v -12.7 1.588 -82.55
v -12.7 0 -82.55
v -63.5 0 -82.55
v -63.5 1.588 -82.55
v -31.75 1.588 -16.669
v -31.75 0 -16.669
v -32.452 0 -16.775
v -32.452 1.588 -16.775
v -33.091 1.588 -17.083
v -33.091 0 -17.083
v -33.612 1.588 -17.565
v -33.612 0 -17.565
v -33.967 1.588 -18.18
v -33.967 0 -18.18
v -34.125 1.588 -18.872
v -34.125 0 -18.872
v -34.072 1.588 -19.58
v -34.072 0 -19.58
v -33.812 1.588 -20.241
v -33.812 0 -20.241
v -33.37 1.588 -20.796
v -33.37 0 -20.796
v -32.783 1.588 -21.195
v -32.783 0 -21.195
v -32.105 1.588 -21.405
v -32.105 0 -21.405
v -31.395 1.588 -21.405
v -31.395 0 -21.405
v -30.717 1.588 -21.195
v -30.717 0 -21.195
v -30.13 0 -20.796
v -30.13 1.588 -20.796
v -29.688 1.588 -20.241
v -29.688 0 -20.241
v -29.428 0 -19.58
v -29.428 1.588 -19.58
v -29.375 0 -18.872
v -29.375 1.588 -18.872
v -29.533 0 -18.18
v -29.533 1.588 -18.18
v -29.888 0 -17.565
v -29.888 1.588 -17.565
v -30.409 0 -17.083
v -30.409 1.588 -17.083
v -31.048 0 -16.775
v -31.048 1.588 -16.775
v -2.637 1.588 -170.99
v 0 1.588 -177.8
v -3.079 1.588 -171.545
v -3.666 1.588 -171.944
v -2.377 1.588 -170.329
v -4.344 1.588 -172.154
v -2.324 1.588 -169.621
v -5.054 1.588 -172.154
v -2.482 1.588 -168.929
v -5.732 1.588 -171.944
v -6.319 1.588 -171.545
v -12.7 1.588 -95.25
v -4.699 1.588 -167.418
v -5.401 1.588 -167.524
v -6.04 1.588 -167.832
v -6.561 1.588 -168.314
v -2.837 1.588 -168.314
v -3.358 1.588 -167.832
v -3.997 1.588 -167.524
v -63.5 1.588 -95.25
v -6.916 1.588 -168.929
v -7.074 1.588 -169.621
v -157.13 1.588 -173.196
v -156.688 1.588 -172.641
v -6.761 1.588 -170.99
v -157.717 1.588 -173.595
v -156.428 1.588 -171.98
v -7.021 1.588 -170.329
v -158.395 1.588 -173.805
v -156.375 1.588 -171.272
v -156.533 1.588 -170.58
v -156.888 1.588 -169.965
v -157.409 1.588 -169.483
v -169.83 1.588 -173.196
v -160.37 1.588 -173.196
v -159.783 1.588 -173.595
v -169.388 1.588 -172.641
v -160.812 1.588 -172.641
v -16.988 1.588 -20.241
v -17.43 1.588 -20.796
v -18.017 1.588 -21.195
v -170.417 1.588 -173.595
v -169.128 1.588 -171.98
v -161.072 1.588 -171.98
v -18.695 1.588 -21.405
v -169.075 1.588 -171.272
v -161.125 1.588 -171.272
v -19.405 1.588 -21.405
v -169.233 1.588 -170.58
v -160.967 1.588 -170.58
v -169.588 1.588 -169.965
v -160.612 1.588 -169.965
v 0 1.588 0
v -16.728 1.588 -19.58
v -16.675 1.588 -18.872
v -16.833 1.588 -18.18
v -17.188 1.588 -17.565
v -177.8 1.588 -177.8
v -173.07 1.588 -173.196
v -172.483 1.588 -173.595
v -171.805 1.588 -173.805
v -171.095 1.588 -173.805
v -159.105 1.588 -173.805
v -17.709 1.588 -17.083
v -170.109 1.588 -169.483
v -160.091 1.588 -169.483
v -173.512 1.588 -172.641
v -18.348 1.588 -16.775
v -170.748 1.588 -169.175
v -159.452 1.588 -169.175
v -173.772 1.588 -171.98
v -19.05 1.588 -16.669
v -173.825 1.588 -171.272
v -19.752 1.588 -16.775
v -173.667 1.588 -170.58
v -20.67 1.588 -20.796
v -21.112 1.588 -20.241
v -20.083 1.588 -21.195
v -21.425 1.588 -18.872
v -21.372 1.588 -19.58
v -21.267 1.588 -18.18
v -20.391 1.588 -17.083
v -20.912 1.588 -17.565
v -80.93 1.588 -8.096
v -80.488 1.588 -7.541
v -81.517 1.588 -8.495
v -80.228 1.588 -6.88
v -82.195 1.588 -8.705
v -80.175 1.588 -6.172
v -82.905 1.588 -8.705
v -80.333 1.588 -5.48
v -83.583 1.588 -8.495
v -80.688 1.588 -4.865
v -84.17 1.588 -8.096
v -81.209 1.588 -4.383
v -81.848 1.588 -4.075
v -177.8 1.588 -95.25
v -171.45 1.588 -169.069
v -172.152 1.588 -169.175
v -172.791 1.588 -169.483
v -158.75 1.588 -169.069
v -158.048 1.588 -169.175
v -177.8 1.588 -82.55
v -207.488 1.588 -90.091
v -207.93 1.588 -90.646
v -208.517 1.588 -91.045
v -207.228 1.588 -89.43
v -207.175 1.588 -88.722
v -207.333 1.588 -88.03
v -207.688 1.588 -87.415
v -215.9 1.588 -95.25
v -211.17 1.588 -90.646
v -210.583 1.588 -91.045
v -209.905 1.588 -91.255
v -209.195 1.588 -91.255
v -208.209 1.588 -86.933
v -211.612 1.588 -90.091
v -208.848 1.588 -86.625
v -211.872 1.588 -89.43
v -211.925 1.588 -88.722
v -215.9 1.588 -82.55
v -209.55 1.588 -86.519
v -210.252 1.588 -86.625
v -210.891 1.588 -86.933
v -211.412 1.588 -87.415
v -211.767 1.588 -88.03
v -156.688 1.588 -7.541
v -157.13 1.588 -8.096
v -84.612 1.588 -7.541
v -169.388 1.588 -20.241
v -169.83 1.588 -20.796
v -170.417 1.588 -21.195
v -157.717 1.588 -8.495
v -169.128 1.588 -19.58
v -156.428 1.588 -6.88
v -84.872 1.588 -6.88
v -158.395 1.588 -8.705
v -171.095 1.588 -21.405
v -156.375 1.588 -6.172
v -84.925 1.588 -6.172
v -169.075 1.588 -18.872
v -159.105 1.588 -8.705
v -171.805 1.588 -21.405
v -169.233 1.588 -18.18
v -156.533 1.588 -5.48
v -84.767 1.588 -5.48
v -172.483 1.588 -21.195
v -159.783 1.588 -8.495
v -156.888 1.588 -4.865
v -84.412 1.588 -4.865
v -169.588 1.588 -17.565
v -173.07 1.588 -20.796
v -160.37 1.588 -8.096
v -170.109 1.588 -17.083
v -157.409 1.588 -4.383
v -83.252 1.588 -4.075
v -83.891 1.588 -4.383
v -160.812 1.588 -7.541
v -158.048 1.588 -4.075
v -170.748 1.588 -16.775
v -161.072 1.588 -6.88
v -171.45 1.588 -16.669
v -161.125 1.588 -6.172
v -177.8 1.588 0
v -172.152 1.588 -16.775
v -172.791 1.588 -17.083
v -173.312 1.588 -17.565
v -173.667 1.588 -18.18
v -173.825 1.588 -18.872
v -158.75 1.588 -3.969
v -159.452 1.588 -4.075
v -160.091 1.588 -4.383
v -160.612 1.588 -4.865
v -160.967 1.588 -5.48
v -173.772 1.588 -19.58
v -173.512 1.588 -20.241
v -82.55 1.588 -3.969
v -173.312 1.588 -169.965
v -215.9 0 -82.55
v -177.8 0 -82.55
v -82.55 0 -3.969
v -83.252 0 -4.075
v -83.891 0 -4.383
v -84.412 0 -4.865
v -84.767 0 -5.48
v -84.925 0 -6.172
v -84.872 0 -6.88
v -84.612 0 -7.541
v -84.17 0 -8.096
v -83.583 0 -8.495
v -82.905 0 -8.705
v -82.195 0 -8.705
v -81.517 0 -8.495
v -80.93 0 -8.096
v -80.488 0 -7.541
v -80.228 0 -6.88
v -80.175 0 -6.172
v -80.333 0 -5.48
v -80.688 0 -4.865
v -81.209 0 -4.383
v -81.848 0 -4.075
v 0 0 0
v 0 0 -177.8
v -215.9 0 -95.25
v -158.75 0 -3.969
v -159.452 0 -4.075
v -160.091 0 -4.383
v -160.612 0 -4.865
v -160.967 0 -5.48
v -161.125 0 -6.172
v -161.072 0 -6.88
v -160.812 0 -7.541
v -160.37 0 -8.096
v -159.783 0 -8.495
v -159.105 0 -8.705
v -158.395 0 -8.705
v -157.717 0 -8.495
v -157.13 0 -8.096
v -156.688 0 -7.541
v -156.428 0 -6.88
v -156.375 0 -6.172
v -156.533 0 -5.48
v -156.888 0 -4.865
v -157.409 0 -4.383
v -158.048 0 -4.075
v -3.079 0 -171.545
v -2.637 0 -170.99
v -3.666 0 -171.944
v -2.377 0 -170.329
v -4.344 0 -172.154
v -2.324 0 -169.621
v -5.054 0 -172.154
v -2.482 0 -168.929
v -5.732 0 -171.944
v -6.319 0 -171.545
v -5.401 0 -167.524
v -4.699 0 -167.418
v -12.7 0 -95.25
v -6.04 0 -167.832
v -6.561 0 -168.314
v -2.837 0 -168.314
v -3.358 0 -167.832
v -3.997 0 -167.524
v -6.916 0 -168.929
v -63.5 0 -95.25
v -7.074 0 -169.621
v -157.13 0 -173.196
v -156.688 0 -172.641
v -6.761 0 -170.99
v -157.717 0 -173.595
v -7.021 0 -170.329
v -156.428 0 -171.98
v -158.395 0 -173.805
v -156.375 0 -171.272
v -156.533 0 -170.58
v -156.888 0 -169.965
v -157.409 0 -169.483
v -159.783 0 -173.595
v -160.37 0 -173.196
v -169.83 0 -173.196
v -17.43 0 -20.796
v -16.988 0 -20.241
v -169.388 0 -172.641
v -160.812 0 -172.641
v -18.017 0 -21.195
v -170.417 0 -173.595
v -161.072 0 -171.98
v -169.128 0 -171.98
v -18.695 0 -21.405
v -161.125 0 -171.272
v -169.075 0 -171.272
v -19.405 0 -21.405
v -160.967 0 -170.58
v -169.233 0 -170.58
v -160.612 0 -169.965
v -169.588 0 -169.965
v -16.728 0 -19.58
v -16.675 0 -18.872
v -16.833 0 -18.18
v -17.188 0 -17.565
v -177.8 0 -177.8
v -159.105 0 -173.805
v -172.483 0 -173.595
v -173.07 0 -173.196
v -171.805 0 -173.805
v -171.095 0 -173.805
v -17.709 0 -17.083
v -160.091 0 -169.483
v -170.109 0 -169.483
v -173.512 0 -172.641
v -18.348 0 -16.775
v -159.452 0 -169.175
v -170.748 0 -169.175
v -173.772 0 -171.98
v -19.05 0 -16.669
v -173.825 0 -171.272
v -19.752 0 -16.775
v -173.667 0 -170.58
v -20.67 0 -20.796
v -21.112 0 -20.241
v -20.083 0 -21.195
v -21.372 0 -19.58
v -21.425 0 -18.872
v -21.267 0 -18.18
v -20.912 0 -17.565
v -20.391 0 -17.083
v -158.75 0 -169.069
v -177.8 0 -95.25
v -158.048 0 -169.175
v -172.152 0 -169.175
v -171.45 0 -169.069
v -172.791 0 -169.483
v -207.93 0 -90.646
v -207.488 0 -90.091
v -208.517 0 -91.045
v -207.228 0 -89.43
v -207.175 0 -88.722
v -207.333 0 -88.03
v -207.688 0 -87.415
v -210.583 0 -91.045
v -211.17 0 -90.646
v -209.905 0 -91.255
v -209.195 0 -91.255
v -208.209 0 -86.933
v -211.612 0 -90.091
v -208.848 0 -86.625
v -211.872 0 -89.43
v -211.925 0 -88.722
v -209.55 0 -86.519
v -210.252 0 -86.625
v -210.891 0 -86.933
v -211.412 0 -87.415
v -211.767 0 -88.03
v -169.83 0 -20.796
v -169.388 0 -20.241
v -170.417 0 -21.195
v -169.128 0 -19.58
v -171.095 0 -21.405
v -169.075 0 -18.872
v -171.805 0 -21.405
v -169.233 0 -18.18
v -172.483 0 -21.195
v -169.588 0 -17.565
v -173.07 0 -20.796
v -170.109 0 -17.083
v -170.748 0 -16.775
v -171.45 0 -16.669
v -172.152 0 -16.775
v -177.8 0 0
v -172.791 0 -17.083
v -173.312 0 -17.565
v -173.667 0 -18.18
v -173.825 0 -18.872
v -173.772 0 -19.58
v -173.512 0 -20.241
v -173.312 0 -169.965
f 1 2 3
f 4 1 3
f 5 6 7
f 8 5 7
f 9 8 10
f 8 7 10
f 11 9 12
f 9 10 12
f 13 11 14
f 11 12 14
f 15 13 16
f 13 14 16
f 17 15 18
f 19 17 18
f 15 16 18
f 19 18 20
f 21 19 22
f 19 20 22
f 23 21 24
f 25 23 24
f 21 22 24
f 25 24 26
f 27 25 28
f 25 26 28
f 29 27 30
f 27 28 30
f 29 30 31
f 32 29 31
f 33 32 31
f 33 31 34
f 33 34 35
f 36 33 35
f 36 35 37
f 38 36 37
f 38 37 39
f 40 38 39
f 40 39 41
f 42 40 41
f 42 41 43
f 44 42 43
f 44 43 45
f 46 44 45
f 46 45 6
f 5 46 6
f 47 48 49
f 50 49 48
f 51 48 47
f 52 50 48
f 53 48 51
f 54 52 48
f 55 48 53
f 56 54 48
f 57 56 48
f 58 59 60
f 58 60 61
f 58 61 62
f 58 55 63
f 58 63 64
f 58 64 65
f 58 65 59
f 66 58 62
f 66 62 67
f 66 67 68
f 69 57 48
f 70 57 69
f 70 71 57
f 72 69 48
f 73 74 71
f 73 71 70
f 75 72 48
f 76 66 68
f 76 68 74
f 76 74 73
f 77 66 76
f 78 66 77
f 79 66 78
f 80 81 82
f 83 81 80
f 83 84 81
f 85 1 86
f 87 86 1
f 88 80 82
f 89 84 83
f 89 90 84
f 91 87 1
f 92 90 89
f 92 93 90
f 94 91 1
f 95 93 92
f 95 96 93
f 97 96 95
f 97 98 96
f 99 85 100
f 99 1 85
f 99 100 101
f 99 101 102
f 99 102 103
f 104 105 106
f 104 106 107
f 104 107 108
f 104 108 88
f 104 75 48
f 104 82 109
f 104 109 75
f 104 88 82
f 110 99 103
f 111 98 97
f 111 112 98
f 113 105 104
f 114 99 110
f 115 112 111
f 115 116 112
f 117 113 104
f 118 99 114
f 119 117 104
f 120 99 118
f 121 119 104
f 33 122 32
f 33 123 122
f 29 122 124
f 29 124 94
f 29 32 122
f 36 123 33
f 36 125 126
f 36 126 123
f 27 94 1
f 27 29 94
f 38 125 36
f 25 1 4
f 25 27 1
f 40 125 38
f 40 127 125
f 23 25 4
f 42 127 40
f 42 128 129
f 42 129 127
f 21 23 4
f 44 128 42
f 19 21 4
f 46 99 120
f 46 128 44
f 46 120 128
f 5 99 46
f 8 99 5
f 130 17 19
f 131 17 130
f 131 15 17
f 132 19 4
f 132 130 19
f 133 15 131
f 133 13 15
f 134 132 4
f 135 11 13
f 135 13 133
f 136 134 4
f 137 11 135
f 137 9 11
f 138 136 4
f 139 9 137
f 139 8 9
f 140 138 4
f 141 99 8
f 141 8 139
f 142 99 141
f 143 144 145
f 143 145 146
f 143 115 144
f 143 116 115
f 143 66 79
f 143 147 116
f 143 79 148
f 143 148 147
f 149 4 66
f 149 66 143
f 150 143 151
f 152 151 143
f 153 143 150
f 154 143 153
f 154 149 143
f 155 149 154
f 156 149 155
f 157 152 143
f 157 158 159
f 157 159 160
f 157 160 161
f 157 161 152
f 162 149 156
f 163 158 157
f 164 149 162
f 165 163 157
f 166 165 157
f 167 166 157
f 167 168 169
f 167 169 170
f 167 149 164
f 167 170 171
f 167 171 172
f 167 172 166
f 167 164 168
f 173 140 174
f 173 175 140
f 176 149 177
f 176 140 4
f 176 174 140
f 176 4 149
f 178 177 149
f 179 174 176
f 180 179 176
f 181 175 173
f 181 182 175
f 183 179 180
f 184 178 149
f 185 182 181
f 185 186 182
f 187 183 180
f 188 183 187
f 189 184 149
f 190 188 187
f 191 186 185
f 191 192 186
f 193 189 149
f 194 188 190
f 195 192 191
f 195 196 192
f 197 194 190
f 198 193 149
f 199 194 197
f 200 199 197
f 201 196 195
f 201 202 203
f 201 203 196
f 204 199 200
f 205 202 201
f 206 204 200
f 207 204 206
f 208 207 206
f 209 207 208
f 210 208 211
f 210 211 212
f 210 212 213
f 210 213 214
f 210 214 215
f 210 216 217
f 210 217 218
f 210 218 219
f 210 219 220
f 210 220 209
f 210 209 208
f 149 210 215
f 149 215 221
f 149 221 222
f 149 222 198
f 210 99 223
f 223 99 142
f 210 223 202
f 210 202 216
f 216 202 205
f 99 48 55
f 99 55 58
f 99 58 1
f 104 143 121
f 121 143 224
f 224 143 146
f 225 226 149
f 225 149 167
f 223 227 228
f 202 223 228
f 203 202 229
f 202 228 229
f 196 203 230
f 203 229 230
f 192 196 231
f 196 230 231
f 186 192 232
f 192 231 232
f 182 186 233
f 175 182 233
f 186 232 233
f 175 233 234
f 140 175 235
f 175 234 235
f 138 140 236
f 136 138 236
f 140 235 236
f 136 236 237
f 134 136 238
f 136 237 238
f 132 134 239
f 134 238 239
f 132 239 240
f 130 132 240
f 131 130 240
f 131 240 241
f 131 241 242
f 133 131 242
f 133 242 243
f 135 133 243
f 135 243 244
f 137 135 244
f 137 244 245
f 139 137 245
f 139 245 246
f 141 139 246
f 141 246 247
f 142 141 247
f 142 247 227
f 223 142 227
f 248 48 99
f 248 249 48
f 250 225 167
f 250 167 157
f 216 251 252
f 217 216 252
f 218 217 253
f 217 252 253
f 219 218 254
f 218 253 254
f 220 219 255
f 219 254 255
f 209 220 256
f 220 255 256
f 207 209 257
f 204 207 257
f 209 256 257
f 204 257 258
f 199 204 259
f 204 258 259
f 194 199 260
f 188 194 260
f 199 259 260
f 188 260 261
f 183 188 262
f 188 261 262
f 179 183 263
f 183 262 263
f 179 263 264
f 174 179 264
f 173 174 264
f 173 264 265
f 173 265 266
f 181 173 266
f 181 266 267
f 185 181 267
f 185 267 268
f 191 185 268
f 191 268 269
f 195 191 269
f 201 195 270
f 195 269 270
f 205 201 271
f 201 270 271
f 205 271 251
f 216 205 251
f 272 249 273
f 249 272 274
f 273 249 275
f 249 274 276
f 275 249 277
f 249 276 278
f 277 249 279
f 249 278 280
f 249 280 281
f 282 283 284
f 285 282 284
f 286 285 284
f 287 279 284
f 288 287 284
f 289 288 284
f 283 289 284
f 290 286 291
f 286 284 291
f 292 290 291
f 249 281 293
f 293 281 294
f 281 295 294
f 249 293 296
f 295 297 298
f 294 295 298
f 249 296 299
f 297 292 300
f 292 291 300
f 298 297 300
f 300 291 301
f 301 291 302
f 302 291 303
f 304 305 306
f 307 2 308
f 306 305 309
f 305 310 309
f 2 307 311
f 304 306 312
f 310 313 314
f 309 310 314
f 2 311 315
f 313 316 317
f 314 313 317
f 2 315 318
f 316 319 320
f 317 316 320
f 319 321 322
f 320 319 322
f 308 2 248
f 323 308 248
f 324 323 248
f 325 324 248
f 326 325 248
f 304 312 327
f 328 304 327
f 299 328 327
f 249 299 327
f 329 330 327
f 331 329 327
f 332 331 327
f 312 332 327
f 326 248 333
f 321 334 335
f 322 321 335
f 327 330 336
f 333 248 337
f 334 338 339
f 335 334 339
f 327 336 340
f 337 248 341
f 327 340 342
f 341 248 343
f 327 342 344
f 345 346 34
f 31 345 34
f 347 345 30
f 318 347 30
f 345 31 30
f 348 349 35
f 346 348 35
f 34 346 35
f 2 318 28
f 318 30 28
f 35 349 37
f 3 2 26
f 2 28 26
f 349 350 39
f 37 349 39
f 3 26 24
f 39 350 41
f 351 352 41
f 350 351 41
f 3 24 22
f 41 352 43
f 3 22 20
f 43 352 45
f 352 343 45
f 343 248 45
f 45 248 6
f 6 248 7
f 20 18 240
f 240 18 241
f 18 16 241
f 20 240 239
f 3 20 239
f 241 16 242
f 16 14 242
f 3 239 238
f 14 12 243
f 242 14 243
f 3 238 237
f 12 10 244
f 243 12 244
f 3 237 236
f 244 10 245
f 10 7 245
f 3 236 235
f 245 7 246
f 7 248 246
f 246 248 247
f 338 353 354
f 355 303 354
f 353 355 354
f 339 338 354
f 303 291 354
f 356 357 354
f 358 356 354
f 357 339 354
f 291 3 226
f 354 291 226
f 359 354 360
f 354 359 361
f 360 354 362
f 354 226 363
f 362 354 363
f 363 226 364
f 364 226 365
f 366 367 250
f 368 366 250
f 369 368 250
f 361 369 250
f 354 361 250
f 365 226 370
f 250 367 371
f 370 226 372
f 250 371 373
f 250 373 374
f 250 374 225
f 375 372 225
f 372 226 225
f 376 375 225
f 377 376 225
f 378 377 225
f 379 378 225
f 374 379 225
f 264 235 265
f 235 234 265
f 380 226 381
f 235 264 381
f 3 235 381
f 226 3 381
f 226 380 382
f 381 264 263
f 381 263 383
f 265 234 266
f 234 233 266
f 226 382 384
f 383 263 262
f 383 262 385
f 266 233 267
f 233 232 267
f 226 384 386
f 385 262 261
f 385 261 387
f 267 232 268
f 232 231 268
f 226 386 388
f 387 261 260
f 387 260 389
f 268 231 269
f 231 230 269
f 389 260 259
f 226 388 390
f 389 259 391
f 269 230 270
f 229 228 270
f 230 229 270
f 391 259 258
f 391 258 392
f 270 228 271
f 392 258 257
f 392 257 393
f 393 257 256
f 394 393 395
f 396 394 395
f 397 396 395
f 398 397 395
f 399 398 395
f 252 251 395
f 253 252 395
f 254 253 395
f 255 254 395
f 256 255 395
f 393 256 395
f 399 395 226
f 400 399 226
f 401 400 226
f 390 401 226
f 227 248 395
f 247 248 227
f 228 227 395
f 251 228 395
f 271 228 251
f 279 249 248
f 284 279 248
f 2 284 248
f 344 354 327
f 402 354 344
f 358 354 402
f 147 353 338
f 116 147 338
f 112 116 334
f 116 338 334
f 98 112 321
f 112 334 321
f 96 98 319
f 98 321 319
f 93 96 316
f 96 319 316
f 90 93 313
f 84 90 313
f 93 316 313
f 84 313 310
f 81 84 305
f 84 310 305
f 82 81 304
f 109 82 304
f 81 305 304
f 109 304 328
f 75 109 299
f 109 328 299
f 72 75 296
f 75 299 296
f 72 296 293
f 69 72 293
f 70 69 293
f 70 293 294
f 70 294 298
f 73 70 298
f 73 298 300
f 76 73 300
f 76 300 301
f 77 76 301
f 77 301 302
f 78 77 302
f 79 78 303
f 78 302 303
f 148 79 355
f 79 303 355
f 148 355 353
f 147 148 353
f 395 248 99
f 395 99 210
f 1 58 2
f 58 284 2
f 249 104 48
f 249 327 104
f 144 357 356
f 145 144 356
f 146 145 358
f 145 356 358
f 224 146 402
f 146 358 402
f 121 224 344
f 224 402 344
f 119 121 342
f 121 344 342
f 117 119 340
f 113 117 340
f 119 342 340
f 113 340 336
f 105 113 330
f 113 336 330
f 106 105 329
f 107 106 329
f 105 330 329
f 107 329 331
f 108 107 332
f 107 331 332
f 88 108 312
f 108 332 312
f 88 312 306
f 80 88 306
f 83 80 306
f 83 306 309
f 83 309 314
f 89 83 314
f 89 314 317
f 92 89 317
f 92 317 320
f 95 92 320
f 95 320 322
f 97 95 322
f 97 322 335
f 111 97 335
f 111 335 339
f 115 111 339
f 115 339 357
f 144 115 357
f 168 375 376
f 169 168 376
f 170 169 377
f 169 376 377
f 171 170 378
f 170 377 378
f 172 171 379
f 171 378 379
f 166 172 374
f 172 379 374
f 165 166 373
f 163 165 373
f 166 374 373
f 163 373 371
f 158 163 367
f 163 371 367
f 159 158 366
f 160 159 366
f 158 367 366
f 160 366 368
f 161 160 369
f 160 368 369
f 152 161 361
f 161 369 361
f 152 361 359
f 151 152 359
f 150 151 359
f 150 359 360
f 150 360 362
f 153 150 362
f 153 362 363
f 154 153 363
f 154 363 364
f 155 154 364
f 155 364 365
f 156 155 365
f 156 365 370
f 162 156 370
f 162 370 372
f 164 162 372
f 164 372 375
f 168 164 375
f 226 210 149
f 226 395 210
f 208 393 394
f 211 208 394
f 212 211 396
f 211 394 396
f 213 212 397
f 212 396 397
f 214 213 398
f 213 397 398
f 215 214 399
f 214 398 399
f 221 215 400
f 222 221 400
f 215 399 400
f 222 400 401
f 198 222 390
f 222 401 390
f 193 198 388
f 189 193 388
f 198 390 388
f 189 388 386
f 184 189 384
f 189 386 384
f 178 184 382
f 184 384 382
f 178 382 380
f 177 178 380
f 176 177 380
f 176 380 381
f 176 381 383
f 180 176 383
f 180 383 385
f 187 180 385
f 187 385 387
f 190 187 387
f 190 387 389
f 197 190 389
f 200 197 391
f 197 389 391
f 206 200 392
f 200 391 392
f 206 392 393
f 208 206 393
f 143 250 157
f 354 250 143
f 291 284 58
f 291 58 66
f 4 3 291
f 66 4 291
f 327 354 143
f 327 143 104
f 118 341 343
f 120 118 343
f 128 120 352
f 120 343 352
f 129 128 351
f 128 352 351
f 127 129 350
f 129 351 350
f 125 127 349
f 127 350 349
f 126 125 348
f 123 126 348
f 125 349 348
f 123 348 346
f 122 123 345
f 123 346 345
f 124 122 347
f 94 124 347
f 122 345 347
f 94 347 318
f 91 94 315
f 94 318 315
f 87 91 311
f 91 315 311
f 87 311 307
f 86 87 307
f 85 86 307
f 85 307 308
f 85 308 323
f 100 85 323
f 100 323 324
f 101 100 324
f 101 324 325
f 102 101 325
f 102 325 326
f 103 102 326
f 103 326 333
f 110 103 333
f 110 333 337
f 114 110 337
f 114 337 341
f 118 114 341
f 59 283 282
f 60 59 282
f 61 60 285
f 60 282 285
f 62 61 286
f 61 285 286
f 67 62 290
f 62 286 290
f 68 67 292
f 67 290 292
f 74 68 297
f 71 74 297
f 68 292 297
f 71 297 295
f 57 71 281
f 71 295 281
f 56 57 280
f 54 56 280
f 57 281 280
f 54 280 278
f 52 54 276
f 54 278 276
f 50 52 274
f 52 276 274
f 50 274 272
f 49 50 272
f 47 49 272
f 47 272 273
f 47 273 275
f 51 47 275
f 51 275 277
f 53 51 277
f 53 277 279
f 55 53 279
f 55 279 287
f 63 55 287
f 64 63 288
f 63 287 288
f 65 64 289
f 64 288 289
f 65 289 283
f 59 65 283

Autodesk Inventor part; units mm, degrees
ref_plane "YZ Plane" through (0, 0, 0) normal (1, 0, 0) x (0, 1, 0)
ref_plane "XZ Plane" through (0, 0, 0) normal (0, 1, 0) x (-1, 0, 0)
ref_plane "XY Plane" through (0, 0, 0) normal (0, 0, 1) x (1, 0, 0)
sketch "Sketch1" plane through (0, 0, 0) normal (0, 1, 0) x (-1, 0, 0)
  line L0 (0, 0) -> (177.8, 0)
  line L1 (177.8, -177.8) -> (0, -177.8)
  line L2 (0, -177.8) -> (0, 0)
  line L3 (177.8, 0) -> (177.8, -82.55)
  line L4 (177.8, -82.55) -> (215.9, -82.55)
  line L5 (215.9, -82.55) -> (215.9, -95.25)
  line L6 (215.9, -95.25) -> (177.8, -95.25)
  line L7 (177.8, -95.25) -> (177.8, -177.8)
  line L8 (0, 0) -> (0, -88.9)
  line L9 (63.5, -88.9) -> (63.5, -95.25)
  line L10 (12.7, -88.9) -> (12.7, -95.25)
  line L11 (12.7, -95.25) -> (63.5, -95.25)
  line L12 (12.7, -95.25) -> (12.7, -82.55)
  line L13 (12.7, -82.55) -> (63.5, -82.55)
  line L14 (63.5, -82.55) -> (63.5, -95.25)
  dimension "d0" = 177.8
  dimension "d1" = 177.8
  dimension "d39" = 82.55
  dimension "d41" = 12.7
  dimension "d44" = 6.35
  dimension "d45" = 12.7
extrude "Extrusion1" add sketch "Sketch1" along normal blind 1.5875
sketch "Sketch2" plane through (0, 1.5875, 0) normal (0, 1, 0) x (1, 0, 0)
  line L0 (-177.8, 177.8) -> (-177.8, 0) projected
  line L1 (-177.8, 177.8) -> (-177.8, 165.1)
  line L2 (-177.8, 165.1) -> (-165.1, 177.8)
  line L3 (0, 177.8) -> (-177.8, 177.8) projected
  line L4 (-177.8, 177.8) -> (-171.45, 171.45)
  line L5 (-171.45, 171.45) -> (-158.75, 171.45)
  line L6 (-177.8, 0) -> (-165.1, 0)
  line L7 (-177.8, 0) -> (0, 0) projected
  line L8 (0, 177.8) -> (-12.7, 177.8)
  line L9 (0, 0) -> (0, 177.8) projected
  line L10 (0, 0) -> (0, 12.7)
  line L11 (0, 12.7) -> (-12.7, 0)
  line L12 (0, 0) -> (-6.35, 6.35)
  line L13 (-6.35, 6.35) -> (-6.35, 19.05)
  line L14 (-6.35, 19.05) -> (-19.05, 19.05)
  line L15 (-19.05, 19.05) -> (-31.75, 19.05)
  line L16 (-12.7, 177.8) -> (0, 165.1)
  line L17 (0, 177.8) -> (-6.35, 171.45)
  line L18 (-165.1, 0) -> (-177.8, 12.7)
  line L19 (-177.8, 0) -> (-171.45, 6.35)
  line L20 (-171.45, 6.35) -> (-171.45, 19.05)
  line L21 (-171.45, 6.35) -> (-158.75, 6.35)
  line L22 (-6.35, 171.45) -> (-6.35, 169.799)
  line L23 (-6.35, 169.799) -> (-4.699, 169.799)
  line L24 (-215.9, 82.55) -> (-177.8, 82.55) projected
  line L25 (-215.9, 82.55) -> (-203.2, 95.25)
  line L26 (-177.8, 95.25) -> (-215.9, 95.25) projected
  line L27 (-215.9, 82.55) -> (-197.9395, 82.55) construction
  line L28 (-203.2, 95.25) -> (-215.9, 95.25)
  line L29 (-215.9, 95.25) -> (-203.2, 82.55)
  point P0 (-209.55, 88.9)
  dimension "d4" = 12.7
  dimension "d5" = 45
  dimension "d6" = 12.7
  dimension "d7" = 12.7
  dimension "d12" = 12.7
  dimension "d28" = 1.651
  dimension "d42" = 45
hole "Hole2" at (-171.45, 1.5875, -171.45) at (-158.75, 1.5875, -171.45) at (-19.05, 1.5875, -19.05) at (-31.75, 1.5875, -19.05) at (-171.45, 1.5875, -19.05) at (-158.75, 1.5875, -6.35) at (-4.699, 1.5875, -169.799) at (-209.55, 1.5875, -88.9) direction (0, -1, 0) diameter 4.7625 end through all
sketch "Sketch3" plane through (0, 1.5875, 0) normal (0, 1, 0) x (1, 0, 0)
  line L0 (0, 0) -> (0, 12.7)
  line L1 (0, 0) -> (0, 177.8) projected
  line L2 (0, 12.7) -> (-12.7, 0)
  line L3 (-177.8, 0) -> (0, 0) projected
  line L4 (-12.7, 0) -> (0, 0)
  line L5 (0, 0) -> (-6.35, 6.35)
  line L6 (-6.35, 6.35) -> (-82.55, 6.35)
  dimension "d29" = 12.7
  dimension "d30" = 45
  dimension "d31" = 76.2
hole "Hole3" at (-82.55, 1.5875, -6.35) direction (0, -1, 0) diameter 4.7625 end through all
properties part number "shoot" material "ABS Plastic"
